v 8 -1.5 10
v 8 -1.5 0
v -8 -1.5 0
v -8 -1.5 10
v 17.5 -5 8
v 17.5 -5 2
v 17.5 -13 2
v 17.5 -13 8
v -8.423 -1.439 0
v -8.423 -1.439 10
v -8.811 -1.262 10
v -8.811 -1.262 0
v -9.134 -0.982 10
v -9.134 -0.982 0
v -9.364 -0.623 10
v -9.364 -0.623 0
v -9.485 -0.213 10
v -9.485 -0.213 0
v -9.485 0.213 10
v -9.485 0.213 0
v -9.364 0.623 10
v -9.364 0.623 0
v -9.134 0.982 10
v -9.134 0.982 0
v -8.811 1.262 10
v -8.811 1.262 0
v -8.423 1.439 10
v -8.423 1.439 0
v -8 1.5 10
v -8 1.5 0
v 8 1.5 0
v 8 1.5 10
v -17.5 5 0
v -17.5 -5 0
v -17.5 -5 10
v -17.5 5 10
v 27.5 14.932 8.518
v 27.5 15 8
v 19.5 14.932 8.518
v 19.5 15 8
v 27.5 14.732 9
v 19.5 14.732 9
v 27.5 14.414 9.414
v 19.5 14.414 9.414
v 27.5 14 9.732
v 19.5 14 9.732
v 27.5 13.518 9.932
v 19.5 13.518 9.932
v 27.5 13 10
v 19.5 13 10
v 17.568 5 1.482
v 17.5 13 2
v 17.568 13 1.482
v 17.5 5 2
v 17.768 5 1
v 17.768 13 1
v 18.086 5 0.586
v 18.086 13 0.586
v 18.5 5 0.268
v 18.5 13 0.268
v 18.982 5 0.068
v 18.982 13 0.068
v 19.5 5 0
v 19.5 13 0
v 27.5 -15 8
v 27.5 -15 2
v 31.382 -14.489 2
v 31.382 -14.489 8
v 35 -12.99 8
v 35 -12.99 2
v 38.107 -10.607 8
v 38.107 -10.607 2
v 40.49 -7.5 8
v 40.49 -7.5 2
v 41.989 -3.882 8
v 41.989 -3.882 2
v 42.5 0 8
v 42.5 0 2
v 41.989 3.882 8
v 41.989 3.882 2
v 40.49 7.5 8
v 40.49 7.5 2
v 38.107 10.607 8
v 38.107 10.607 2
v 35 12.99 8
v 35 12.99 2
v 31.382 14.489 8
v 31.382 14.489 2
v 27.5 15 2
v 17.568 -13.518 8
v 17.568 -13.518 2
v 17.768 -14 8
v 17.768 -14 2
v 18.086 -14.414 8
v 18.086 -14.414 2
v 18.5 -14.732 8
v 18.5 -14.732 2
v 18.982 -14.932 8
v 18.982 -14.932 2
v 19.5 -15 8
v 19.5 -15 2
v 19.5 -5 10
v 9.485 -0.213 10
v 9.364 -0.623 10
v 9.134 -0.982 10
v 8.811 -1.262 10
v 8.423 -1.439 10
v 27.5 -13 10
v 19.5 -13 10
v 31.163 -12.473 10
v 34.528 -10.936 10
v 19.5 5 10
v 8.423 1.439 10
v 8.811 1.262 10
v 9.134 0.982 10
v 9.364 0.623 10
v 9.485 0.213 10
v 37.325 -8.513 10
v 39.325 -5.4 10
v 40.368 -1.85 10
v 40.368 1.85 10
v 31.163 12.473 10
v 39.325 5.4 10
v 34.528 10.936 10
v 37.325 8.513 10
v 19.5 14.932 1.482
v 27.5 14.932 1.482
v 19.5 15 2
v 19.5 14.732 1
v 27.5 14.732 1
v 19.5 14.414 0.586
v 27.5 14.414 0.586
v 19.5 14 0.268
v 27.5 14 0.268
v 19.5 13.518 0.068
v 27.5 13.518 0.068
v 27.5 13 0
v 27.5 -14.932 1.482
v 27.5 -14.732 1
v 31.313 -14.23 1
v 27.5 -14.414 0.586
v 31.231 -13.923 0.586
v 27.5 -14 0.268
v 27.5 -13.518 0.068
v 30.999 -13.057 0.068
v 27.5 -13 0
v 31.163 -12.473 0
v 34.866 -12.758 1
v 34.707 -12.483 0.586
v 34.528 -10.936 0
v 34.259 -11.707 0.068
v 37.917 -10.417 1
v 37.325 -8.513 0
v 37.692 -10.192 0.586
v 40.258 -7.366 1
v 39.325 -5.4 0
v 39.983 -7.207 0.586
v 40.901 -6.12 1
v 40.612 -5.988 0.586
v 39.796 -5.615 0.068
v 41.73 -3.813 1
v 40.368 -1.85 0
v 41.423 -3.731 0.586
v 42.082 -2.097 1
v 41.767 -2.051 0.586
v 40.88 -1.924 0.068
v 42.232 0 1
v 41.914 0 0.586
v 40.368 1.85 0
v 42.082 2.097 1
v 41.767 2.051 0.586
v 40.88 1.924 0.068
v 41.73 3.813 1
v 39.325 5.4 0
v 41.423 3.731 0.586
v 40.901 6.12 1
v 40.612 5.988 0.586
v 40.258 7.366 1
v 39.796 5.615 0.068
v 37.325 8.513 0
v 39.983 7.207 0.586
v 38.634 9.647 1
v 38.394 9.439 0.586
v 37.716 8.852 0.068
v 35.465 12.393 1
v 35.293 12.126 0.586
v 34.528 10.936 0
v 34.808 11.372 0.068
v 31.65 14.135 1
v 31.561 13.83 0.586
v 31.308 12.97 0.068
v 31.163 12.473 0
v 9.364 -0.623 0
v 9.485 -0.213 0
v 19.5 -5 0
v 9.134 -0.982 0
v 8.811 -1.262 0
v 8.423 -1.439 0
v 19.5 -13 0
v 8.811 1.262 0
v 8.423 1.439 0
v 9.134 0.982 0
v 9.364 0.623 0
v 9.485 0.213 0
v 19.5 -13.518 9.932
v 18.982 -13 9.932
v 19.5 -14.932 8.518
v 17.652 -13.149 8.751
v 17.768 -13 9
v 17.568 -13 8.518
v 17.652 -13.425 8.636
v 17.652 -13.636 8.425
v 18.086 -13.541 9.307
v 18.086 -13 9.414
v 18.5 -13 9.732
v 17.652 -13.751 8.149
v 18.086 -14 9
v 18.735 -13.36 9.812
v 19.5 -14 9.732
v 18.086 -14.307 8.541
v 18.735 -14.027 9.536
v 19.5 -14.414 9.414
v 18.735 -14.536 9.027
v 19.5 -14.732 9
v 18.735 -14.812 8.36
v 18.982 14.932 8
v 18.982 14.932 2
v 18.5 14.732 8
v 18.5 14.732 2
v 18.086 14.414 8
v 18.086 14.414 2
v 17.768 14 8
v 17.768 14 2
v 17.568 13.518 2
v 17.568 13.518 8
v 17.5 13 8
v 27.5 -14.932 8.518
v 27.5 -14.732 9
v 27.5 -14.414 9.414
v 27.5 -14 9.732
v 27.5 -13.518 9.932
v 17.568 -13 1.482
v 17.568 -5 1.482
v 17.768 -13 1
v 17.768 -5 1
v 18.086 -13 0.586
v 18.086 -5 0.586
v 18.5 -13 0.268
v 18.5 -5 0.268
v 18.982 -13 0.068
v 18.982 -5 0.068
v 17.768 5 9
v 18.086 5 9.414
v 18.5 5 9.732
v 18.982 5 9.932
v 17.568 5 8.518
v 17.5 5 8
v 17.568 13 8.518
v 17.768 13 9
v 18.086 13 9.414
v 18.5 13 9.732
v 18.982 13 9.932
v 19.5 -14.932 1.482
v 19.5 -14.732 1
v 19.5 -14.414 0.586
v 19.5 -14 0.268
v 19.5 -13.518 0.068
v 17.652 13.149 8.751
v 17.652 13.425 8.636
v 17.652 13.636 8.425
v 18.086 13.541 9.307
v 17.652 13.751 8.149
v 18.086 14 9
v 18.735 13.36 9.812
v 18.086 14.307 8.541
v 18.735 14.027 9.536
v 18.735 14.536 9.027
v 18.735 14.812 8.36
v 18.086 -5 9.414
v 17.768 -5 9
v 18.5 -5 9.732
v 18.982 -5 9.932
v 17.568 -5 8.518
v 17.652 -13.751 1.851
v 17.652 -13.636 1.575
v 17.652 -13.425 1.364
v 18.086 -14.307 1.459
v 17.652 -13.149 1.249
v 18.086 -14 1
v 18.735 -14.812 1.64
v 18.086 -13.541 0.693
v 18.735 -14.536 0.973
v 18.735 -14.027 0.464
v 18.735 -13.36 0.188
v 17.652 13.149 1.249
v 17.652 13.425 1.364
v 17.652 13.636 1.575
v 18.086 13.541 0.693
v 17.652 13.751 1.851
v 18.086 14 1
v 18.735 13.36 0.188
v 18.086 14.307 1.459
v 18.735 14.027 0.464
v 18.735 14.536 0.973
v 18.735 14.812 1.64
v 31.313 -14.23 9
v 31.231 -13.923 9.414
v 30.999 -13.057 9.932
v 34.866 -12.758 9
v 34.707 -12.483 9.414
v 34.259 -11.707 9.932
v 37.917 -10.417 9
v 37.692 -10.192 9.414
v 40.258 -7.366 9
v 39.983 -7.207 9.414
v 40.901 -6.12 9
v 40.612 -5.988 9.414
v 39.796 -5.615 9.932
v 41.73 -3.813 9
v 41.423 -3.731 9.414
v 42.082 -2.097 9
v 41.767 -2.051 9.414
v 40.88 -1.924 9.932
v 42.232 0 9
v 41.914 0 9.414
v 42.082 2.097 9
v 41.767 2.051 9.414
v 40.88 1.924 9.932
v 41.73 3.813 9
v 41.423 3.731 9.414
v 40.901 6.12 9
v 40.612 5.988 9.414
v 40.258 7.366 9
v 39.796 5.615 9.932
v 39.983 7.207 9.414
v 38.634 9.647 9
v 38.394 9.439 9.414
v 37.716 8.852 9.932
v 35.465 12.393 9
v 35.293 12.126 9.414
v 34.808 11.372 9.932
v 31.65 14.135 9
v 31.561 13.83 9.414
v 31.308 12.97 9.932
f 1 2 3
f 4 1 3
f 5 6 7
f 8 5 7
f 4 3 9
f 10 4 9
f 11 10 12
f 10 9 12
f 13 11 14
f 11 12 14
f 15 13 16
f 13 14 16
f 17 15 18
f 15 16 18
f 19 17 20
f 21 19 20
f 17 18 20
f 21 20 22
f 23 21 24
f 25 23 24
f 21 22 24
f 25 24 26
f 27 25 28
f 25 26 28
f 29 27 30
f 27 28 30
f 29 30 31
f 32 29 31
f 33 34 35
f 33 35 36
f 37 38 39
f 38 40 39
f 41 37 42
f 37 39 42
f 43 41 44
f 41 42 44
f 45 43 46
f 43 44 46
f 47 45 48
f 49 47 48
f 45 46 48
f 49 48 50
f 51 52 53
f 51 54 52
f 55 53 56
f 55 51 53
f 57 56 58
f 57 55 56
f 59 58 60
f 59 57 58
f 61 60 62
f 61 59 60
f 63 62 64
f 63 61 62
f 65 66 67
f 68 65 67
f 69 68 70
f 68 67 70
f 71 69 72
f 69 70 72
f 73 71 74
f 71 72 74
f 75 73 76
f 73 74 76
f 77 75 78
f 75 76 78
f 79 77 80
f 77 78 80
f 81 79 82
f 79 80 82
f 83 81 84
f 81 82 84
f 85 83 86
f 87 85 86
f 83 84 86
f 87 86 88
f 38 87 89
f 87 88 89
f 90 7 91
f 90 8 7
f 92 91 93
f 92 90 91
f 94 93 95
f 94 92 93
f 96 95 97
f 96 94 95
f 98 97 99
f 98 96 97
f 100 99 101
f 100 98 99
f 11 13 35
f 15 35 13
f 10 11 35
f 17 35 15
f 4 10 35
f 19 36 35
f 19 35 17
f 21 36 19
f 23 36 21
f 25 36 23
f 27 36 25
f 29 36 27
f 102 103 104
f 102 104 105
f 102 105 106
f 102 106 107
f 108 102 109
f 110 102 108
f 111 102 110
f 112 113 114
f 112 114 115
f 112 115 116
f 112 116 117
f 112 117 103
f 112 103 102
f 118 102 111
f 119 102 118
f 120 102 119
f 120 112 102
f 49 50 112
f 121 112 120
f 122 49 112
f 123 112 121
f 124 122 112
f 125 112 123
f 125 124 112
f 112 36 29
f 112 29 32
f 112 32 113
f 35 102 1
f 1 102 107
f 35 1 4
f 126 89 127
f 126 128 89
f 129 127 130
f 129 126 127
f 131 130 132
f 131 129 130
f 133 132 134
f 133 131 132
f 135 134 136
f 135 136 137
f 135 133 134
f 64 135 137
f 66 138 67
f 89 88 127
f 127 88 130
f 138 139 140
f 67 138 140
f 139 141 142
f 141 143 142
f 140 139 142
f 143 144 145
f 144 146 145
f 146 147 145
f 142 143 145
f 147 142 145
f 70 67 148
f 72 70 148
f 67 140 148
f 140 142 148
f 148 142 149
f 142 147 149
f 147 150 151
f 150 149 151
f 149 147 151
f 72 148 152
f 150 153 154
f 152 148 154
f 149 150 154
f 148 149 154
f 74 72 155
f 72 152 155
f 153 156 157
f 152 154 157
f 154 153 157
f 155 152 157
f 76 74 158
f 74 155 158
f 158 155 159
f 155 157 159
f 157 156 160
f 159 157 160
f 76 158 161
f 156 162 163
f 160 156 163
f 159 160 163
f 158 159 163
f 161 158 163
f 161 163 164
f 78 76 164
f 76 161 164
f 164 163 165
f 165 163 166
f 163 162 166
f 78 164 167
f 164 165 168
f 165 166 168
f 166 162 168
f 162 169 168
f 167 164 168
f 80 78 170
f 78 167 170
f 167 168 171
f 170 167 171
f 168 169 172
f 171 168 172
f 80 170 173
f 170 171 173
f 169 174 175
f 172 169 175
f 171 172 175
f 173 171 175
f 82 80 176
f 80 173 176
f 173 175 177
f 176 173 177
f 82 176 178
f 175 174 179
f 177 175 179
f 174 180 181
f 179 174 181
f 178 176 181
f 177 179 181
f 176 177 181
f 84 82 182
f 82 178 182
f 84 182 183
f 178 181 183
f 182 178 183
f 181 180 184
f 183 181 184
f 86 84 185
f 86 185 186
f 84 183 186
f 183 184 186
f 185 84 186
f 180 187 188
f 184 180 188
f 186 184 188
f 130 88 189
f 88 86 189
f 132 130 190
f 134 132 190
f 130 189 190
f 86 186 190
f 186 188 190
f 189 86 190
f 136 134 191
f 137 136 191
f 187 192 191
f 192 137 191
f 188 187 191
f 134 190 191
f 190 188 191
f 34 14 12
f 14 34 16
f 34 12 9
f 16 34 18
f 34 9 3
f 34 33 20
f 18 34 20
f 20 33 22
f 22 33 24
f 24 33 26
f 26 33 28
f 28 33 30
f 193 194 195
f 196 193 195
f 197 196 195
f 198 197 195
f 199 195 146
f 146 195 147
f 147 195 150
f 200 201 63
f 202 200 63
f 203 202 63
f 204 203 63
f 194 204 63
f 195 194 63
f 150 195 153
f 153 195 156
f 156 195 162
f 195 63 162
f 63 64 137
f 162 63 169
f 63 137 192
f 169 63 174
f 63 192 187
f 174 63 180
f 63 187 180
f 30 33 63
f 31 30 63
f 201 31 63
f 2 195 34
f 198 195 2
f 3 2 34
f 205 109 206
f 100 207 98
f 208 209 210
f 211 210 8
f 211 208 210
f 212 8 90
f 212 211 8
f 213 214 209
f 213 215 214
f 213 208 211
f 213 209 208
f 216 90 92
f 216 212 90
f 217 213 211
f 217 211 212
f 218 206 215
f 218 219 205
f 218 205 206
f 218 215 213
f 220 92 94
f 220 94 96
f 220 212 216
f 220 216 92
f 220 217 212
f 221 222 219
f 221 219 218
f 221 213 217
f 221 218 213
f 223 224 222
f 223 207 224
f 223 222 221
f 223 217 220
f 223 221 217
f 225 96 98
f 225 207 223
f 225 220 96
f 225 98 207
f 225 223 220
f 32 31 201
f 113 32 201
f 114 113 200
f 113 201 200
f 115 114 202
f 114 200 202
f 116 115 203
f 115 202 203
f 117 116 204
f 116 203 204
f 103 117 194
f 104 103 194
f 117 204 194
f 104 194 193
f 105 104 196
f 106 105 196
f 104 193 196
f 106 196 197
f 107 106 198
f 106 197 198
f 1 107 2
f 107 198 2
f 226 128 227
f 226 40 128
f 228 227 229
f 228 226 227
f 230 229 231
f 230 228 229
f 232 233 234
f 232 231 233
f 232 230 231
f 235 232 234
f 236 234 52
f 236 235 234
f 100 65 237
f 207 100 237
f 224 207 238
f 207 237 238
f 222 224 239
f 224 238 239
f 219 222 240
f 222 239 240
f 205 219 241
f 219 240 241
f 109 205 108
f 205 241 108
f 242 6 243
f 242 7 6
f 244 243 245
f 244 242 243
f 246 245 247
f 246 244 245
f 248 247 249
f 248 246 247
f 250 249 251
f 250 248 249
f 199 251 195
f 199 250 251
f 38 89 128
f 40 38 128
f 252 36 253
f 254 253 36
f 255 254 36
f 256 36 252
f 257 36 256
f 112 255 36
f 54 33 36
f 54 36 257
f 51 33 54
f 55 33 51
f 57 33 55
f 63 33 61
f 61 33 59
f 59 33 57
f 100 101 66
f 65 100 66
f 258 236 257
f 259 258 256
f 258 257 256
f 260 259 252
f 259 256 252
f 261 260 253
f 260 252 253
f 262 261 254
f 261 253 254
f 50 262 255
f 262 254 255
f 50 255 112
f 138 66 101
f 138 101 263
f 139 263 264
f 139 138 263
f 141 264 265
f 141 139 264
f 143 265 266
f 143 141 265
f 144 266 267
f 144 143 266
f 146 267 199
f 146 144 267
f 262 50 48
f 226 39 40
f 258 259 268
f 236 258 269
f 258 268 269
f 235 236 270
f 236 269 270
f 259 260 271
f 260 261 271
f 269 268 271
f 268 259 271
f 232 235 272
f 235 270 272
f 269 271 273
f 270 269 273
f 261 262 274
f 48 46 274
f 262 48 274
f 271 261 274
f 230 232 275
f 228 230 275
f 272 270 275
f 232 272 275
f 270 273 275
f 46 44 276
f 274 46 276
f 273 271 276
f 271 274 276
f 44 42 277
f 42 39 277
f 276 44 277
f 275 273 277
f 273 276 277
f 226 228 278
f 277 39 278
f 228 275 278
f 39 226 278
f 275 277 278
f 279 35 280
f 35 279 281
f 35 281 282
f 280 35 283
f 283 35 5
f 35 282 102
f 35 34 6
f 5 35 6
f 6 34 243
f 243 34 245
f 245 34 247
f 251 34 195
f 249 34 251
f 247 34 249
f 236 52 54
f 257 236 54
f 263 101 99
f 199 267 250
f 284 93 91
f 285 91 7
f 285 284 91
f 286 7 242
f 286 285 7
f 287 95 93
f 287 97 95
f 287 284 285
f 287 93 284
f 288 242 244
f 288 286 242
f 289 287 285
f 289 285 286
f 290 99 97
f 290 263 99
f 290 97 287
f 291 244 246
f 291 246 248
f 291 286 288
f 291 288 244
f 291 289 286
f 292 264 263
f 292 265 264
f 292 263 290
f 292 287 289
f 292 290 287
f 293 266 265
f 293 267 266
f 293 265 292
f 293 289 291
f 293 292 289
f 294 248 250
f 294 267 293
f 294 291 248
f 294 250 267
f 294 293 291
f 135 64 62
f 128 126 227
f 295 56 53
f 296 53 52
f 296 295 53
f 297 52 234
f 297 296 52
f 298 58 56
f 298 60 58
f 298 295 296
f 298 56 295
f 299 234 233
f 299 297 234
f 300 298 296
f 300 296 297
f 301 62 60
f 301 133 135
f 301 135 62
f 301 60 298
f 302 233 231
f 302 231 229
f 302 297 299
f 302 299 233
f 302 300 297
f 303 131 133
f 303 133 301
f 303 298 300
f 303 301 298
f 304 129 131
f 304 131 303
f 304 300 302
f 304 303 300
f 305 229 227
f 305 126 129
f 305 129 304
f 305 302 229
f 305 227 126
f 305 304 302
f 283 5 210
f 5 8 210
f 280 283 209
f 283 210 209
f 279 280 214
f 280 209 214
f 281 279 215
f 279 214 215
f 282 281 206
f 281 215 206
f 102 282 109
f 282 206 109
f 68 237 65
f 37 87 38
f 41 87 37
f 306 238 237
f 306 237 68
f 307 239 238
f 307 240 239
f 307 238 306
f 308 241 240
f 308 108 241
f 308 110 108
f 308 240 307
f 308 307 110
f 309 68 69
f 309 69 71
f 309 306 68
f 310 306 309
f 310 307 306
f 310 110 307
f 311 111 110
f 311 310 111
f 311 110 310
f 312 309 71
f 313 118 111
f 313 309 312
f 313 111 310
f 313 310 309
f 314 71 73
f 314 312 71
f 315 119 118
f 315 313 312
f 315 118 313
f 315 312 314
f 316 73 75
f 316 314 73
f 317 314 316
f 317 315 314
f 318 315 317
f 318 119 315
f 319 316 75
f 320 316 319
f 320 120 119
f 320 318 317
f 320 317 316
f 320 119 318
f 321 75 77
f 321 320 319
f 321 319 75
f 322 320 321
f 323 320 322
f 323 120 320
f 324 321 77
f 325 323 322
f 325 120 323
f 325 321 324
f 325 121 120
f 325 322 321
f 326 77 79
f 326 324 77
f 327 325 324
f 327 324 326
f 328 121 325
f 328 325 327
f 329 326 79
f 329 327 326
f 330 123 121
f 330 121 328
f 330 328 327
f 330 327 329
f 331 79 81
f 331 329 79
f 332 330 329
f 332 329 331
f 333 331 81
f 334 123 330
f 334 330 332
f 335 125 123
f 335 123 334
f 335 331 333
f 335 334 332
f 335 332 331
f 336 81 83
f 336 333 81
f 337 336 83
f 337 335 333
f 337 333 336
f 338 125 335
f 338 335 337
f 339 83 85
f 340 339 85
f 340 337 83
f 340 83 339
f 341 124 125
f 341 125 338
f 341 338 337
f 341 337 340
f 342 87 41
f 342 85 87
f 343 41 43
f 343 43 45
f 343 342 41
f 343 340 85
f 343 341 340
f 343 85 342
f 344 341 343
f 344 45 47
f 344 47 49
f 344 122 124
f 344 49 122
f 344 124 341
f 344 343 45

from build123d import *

# Parameters (mm, degrees)
F0_W     = 35
F0_H     = 10
F1_DEPTH = 10
F2_R     = 2


# Not quite as in the source:
# - a feature names something its author has since deleted; it is built from what else it names


with BuildPart() as f1:
    # F0 (on Top) → F1 (new body)
    with BuildSketch(Plane.XY):
        Rectangle(F0_W, F0_H)
        with BuildLine():
            Line((-8, 1.5), (0, 1.5))
            Line((0, 1.5), (8, 1.5))
            ThreePointArc((8, 1.5), (9.5, 0), (8, -1.5))
            Line((8, -1.5), (0, -1.5))
            Line((0, -1.5), (-8, -1.5))
            ThreePointArc((-8, -1.5), (-9.5, 0), (-8, 1.5))
        make_face(mode=Mode.SUBTRACT)
        Polygon((17.5, 15), (17.5, 5), (17.5, -5), (17.5, -15), (27.5, -15), (27.5, 15), align=None)
        with BuildLine():
            ThreePointArc((27.5, -15), (42.5, 0), (27.5, 15))
            Line((27.5, 15), (27.5, -15))
        make_face()
    extrude(amount=F1_DEPTH)

    # F2
    f2_edges = [f1.edges().sort_by_distance(p)[0] for p in [
        (27.5, 15, 5),
        (27.5, -15, 5),
        (42.5, 0, 10),
        (42.5, 0, 0),
        (17.5, 10, 10),
        (17.5, -10, 10),
        (17.5, -15, 5),
        (17.5, 10, 0),
        (17.5, -10, 0),
        (17.5, 15, 5),
    ]]
    fillet(f2_edges, radius=F2_R)


solid = f1.part
